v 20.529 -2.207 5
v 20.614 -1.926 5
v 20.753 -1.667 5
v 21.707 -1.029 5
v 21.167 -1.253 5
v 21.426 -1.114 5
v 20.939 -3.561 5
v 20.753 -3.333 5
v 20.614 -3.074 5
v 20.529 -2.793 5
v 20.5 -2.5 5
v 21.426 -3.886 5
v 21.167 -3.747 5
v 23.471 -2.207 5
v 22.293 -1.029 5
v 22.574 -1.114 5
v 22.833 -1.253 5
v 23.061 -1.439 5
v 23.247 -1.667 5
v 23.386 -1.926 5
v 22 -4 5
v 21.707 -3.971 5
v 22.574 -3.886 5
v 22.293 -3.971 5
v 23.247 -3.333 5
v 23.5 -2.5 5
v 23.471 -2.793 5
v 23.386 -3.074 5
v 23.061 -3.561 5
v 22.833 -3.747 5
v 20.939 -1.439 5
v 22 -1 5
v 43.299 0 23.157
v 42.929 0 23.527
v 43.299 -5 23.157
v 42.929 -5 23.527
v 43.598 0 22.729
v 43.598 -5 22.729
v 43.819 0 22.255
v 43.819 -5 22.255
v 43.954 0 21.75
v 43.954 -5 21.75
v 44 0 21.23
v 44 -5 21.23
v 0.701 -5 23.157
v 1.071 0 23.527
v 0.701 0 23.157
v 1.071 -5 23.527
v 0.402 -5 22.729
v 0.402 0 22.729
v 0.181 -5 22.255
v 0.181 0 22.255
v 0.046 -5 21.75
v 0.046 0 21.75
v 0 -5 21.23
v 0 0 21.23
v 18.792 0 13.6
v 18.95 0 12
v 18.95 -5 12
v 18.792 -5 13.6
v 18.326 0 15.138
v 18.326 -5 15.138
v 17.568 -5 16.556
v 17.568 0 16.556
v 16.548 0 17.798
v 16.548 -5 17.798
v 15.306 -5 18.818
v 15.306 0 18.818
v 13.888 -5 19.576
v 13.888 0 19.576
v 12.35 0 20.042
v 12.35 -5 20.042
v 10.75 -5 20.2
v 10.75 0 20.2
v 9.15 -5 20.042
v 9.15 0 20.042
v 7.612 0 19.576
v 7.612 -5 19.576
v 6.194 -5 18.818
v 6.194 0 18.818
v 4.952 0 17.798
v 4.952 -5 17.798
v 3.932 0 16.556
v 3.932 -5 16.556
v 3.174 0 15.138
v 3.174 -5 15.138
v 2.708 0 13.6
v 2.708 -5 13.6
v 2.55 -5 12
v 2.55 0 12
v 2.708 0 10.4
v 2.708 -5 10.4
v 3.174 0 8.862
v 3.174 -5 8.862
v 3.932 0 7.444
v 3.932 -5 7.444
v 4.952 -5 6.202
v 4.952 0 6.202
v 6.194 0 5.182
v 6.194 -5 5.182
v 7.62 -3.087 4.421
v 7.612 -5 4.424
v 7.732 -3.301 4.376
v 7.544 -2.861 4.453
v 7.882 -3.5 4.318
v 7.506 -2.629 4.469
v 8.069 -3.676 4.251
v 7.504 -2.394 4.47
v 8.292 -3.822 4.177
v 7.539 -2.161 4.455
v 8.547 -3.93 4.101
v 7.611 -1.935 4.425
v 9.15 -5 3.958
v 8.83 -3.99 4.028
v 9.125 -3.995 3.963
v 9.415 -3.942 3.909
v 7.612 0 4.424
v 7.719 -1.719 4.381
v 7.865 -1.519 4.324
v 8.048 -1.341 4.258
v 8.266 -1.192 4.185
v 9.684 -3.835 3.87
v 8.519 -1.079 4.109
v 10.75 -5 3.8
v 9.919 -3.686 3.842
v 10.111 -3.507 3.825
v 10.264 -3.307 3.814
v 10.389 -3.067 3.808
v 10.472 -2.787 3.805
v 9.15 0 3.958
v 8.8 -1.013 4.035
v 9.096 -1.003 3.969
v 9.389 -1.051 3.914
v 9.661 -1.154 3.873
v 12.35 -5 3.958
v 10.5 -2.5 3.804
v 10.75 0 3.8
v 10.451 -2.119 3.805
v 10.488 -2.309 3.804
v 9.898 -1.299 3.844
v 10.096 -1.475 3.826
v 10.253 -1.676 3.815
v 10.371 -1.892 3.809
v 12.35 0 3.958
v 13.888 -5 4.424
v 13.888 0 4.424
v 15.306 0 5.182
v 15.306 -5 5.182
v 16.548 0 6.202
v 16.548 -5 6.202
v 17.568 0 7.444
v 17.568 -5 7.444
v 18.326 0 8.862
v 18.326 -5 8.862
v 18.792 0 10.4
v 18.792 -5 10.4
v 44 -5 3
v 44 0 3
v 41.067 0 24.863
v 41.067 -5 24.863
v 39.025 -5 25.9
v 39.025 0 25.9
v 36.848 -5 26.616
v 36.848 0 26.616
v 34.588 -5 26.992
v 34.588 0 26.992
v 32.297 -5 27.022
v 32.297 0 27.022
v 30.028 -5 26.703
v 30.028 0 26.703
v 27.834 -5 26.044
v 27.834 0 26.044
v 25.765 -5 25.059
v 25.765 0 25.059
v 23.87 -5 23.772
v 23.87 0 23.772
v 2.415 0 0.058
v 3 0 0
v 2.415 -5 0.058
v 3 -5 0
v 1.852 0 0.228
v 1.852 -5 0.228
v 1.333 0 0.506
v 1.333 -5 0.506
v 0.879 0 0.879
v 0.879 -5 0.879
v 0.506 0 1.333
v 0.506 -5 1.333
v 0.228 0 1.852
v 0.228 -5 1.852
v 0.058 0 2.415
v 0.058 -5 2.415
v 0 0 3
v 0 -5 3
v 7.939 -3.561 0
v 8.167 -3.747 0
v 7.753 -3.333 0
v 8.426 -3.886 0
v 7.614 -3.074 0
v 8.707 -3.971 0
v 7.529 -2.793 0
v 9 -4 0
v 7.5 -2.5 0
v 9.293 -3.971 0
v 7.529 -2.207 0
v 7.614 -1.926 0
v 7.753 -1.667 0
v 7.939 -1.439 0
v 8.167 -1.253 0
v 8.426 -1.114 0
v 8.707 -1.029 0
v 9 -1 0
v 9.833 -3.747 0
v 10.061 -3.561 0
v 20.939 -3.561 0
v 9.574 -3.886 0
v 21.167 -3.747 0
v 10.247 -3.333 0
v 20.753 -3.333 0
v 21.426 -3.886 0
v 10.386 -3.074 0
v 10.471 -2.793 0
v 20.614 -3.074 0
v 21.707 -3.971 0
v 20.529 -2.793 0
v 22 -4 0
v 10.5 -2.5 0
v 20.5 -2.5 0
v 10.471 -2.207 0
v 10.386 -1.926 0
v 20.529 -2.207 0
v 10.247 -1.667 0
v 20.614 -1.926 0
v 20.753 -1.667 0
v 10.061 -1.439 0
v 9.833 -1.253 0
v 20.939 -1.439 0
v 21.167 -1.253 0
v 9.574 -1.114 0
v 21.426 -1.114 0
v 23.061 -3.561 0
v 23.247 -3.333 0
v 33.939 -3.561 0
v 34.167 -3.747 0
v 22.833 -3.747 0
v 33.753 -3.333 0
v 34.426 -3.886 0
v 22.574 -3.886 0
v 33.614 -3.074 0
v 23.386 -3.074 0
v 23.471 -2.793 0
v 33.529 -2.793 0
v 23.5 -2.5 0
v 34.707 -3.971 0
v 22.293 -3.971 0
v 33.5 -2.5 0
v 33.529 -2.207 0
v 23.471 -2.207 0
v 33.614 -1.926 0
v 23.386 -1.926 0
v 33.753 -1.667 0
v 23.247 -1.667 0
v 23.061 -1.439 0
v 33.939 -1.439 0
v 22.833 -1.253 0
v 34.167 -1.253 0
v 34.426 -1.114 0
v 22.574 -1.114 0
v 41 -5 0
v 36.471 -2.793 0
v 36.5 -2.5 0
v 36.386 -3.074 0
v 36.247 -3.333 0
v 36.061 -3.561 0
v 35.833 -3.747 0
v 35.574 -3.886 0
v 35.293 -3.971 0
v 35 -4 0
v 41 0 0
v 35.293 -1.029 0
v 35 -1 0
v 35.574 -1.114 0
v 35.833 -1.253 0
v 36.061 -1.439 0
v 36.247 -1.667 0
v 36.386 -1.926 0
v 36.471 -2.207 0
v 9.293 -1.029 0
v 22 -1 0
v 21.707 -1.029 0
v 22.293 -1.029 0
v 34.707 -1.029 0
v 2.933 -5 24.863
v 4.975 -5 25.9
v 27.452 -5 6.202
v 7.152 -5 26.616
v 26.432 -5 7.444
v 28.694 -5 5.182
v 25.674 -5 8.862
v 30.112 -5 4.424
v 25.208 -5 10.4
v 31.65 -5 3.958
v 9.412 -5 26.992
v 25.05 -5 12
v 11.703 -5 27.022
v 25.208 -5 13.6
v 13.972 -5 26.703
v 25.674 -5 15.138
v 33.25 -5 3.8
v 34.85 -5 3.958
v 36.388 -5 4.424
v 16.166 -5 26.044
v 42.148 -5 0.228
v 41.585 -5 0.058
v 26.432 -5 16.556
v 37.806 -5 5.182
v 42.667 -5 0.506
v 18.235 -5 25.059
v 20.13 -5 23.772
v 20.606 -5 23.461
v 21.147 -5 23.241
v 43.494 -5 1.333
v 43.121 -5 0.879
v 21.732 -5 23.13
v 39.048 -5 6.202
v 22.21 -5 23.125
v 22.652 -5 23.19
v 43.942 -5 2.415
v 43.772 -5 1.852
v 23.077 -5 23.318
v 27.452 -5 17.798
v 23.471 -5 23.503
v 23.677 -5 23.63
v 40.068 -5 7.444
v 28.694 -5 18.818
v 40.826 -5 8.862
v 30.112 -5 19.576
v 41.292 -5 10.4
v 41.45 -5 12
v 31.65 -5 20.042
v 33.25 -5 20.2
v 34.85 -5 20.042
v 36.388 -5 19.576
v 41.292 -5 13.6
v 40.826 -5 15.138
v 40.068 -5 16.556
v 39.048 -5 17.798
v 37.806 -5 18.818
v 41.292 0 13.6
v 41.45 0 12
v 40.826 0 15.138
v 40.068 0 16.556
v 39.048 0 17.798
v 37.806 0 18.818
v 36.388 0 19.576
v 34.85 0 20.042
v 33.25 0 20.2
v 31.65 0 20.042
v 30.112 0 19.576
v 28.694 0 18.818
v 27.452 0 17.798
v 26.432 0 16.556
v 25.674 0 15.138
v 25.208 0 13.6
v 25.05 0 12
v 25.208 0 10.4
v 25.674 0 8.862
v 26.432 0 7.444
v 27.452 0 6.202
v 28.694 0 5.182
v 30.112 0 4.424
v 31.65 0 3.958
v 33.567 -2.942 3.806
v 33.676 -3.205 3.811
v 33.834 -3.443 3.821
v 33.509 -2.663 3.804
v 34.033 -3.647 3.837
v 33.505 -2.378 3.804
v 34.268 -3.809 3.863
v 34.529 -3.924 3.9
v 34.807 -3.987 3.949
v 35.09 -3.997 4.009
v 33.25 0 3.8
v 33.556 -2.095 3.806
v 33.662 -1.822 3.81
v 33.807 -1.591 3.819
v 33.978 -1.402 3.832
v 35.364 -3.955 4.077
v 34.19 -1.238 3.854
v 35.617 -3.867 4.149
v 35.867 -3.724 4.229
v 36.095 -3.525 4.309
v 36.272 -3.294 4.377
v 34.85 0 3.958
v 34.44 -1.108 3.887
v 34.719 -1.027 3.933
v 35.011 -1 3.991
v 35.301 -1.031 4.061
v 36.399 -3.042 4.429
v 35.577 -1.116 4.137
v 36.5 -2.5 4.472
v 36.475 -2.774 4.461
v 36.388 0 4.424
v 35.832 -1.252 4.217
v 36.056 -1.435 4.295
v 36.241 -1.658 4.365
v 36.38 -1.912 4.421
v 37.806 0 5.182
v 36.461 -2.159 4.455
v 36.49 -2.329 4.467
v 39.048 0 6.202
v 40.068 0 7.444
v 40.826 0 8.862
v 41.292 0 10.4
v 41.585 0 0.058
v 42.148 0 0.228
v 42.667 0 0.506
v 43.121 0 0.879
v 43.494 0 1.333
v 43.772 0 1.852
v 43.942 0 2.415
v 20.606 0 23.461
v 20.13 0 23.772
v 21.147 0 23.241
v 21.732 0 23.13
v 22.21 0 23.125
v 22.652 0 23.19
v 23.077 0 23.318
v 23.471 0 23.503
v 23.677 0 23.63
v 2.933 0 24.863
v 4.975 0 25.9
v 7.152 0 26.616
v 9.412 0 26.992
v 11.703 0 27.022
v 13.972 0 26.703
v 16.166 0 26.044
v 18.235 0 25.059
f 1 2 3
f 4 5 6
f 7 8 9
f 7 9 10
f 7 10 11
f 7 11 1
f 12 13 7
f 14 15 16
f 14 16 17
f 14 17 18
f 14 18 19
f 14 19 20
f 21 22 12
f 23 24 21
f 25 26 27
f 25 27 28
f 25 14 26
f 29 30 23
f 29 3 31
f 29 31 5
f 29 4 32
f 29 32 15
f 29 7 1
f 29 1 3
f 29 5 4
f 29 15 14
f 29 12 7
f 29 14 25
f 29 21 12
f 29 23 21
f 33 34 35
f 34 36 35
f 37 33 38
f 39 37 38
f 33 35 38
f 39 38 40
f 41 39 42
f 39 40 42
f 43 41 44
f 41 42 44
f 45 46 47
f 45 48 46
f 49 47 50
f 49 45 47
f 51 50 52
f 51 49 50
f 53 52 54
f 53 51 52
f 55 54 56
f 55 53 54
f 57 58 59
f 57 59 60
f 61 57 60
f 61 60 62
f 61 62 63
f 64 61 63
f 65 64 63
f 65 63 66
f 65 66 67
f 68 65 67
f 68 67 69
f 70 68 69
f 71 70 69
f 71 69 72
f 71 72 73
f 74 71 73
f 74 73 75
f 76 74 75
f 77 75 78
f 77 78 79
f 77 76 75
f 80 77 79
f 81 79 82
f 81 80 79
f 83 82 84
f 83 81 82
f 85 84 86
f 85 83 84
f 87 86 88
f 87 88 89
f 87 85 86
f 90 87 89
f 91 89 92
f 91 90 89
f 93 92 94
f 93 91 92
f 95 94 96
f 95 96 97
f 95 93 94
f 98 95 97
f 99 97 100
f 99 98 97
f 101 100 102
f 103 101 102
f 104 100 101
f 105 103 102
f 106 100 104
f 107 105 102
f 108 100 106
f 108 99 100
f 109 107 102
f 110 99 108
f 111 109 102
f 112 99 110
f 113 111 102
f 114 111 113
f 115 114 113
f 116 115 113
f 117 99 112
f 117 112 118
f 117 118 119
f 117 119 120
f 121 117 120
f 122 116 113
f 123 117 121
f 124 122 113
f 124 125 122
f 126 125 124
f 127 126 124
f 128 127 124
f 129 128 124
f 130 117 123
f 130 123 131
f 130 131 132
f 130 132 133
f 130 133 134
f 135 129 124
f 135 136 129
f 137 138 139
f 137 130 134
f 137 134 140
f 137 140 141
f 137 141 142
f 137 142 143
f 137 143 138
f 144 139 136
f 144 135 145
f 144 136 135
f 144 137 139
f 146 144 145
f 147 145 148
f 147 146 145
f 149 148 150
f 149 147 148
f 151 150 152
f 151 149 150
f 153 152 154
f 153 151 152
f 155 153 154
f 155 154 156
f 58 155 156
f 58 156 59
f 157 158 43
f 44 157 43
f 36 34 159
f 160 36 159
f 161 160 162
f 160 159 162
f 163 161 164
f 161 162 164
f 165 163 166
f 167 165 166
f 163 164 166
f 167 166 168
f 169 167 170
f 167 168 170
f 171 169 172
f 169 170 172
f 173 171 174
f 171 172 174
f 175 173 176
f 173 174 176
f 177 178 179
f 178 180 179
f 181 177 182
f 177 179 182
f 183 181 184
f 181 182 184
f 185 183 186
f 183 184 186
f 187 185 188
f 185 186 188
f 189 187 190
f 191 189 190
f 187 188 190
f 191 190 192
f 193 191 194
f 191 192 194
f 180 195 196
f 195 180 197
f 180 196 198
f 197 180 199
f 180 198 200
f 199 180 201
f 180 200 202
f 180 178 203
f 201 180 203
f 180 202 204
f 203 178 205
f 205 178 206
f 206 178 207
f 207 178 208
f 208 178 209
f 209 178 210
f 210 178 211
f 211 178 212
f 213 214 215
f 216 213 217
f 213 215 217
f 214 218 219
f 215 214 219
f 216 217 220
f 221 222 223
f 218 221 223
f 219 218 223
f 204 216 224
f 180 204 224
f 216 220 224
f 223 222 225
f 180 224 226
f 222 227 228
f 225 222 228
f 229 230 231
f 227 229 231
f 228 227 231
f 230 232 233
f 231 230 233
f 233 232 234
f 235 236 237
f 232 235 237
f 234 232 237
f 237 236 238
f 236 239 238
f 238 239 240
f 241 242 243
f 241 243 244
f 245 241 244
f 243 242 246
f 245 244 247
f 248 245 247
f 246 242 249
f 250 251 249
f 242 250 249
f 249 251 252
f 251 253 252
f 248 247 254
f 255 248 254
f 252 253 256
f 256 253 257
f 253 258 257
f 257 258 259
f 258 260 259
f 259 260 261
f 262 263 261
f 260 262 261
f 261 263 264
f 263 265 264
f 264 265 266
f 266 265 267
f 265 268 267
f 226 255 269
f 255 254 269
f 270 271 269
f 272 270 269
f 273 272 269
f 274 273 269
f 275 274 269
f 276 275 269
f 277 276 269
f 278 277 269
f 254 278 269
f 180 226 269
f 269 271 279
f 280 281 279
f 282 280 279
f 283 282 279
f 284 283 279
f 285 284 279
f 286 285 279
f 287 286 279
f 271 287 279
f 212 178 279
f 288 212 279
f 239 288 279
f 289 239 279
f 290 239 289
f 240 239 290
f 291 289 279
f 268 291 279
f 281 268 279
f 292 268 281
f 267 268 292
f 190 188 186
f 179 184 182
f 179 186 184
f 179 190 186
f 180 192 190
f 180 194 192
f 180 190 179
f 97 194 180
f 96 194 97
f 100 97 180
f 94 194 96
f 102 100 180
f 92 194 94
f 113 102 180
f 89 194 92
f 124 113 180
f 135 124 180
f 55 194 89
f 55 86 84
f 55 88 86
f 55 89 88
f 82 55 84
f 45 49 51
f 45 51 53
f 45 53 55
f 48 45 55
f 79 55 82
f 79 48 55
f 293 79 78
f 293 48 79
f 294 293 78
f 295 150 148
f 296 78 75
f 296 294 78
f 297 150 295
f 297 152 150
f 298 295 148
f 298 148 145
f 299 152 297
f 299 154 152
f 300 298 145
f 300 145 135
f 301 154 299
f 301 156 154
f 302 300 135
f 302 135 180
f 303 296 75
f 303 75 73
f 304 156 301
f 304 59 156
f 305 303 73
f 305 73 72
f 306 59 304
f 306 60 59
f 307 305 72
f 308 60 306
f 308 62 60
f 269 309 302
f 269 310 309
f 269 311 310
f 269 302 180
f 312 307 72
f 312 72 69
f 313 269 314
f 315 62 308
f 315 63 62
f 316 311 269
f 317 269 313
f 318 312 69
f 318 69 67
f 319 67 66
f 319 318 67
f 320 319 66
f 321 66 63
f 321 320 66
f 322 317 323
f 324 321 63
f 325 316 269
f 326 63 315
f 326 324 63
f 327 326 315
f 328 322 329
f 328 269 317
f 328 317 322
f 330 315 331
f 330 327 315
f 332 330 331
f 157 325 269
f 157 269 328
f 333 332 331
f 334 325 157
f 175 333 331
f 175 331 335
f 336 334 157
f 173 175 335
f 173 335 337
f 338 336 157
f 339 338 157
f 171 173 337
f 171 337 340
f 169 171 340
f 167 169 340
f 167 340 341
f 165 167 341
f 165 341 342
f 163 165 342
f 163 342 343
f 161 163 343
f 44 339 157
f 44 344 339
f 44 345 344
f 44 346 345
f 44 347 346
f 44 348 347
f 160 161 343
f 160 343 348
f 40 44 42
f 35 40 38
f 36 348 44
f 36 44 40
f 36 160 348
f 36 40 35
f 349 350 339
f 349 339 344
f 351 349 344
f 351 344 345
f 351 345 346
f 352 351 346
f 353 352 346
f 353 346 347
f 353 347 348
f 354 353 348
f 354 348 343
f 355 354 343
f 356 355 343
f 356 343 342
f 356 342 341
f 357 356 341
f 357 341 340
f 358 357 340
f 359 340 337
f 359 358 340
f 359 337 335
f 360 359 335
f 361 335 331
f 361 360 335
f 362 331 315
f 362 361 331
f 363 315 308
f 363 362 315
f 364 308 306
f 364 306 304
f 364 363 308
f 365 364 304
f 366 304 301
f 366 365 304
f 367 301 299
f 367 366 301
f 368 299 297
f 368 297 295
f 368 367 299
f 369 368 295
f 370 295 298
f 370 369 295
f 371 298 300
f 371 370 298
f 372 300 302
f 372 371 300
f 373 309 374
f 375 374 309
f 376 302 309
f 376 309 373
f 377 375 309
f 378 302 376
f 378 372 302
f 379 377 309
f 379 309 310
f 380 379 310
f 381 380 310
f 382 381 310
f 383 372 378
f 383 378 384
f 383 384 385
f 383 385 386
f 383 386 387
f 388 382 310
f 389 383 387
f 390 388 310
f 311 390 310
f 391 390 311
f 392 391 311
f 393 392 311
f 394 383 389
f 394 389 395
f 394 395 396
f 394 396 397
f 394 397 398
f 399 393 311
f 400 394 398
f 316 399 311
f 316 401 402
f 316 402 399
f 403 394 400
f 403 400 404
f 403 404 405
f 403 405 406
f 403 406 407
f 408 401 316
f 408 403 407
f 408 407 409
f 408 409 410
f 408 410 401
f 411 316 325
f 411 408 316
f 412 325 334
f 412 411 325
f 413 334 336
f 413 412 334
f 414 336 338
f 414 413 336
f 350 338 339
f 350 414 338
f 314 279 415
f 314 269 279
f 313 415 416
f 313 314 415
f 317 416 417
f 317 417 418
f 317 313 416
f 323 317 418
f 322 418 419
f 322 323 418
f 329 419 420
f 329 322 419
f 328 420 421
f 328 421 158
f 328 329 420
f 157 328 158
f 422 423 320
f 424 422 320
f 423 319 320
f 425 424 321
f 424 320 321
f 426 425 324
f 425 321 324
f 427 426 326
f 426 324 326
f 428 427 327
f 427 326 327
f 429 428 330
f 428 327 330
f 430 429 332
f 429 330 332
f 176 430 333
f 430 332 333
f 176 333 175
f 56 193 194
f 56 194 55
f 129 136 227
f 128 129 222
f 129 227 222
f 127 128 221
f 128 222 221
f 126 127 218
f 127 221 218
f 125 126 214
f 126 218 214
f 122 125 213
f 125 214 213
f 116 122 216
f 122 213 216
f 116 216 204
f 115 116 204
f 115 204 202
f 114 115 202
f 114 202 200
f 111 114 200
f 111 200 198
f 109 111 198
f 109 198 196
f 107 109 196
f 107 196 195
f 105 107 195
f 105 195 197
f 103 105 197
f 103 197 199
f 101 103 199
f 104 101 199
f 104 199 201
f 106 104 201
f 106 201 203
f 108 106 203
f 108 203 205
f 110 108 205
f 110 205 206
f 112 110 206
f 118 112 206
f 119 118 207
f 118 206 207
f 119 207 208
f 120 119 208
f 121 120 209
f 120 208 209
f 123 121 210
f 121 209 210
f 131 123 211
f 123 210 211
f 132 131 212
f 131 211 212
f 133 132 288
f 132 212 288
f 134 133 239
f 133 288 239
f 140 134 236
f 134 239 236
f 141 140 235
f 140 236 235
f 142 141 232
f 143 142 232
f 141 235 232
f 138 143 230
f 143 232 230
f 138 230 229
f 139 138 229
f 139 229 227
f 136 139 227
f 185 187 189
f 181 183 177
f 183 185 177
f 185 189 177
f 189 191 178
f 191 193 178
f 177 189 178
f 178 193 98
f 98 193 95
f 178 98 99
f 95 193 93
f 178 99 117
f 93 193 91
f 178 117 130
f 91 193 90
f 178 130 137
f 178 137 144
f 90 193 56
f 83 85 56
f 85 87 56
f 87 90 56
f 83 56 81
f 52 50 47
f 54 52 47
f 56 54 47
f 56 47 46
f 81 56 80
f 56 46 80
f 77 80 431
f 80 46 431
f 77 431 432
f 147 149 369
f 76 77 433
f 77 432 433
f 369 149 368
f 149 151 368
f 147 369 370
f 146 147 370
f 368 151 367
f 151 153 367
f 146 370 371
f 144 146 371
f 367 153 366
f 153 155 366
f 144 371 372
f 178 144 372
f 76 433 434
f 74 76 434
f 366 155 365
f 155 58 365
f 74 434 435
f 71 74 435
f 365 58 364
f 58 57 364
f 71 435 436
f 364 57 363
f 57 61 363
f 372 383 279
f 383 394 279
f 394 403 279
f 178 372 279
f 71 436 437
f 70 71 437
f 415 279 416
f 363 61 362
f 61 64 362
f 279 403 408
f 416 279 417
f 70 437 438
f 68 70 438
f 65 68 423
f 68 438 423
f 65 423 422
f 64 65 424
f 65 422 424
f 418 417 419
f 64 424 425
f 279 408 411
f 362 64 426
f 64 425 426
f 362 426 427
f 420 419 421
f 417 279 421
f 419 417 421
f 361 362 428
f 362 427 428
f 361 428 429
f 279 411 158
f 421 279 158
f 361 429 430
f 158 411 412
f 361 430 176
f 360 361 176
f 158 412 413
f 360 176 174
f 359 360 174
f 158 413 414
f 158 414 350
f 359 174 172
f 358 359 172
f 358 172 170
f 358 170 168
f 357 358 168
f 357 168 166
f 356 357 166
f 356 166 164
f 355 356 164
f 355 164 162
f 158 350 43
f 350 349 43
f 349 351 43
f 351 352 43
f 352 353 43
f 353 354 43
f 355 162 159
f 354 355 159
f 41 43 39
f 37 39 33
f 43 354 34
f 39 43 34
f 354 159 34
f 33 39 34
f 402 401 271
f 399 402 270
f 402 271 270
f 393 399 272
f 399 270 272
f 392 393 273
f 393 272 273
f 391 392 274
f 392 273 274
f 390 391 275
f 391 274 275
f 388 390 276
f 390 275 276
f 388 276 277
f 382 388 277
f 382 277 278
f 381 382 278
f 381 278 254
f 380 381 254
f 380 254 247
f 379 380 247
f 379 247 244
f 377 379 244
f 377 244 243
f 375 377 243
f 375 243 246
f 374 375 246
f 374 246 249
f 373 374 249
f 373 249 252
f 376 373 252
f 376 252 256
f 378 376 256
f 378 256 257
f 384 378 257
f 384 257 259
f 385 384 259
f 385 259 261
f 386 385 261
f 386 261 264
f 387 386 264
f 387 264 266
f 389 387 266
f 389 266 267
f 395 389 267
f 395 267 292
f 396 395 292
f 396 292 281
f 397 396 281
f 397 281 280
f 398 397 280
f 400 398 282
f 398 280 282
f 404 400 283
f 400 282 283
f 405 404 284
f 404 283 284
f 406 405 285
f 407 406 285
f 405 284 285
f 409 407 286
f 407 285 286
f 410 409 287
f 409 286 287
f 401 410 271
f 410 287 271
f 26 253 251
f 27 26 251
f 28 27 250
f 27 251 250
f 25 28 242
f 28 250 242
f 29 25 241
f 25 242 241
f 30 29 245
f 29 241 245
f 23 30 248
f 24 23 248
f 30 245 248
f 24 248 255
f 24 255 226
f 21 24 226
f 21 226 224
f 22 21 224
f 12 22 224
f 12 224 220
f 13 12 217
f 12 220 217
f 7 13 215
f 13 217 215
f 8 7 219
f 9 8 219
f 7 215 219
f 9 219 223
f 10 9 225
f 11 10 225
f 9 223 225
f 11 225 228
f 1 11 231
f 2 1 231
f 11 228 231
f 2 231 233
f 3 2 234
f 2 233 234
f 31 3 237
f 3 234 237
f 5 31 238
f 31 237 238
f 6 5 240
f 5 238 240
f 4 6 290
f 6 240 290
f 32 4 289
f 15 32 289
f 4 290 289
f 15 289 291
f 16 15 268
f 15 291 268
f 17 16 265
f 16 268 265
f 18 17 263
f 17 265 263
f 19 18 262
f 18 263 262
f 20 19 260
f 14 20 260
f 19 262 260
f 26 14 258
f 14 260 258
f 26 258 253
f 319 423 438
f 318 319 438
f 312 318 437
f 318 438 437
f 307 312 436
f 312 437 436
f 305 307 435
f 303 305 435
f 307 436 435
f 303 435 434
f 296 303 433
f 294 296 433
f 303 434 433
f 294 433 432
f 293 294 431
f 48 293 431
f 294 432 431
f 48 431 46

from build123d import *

# Parameters (mm, degrees)
SKETCH_R     = 8.2
PAD_DEPTH    = 5
FILLET_R     = 3
FILLET001_R  = 3
FILLET002_R  = 3
SKETCH001_R  = 1.5
POCKET_DEPTH = 5


with BuildPart() as part:
    # Sketch → Pad (new body)
    with BuildSketch(Plane.XZ):
        with BuildLine():
            Line((0, 0), (44, 0))
            Line((44, 0), (44, 22.535654))
            ThreePointArc((44, 22.535654), (32.883624, 27.047534), (22, 22))
            ThreePointArc((22, 22), (11.116376, 27.047534), (0, 22.535654))
            Line((0, 0), (0, 22.535654))
        make_face()
        with Locations((10.75, 12)):
            Circle(SKETCH_R, mode=Mode.SUBTRACT)
        with Locations((33.25, 12)):
            Circle(SKETCH_R, mode=Mode.SUBTRACT)
    extrude(amount=PAD_DEPTH)

    # Fillet
    fillet_edges = [part.edges().sort_by_distance(p)[0] for p in [
        (0, -2.5, 0),
        (44, -2.5, 0),
    ]]
    fillet(fillet_edges, radius=FILLET_R)

    # Fillet001
    fillet001_edges = [part.edges().sort_by_distance(p)[0] for p in [
        (22, -2.5, 22),
    ]]
    fillet(fillet001_edges, radius=FILLET001_R)

    # Fillet002
    fillet002_edges = [part.edges().sort_by_distance(p)[0] for p in [
        (44, -2.5, 22.535654),
        (0, -2.5, 22.535654),
    ]]
    fillet(fillet002_edges, radius=FILLET002_R)

    # Sketch001 → Pocket (cut)
    with BuildSketch(Plane(origin=(0, 0, 0), x_dir=(1, 0, 0), z_dir=(0, 0, -1))):
        with Locations((9, 2.5)):
            Circle(SKETCH001_R)
        with Locations((35, 2.5)):
            Circle(SKETCH001_R)
        with Locations((22, 2.5)):
            Circle(SKETCH001_R)
    extrude(amount=-POCKET_DEPTH, mode=Mode.SUBTRACT)


solid = part.part
